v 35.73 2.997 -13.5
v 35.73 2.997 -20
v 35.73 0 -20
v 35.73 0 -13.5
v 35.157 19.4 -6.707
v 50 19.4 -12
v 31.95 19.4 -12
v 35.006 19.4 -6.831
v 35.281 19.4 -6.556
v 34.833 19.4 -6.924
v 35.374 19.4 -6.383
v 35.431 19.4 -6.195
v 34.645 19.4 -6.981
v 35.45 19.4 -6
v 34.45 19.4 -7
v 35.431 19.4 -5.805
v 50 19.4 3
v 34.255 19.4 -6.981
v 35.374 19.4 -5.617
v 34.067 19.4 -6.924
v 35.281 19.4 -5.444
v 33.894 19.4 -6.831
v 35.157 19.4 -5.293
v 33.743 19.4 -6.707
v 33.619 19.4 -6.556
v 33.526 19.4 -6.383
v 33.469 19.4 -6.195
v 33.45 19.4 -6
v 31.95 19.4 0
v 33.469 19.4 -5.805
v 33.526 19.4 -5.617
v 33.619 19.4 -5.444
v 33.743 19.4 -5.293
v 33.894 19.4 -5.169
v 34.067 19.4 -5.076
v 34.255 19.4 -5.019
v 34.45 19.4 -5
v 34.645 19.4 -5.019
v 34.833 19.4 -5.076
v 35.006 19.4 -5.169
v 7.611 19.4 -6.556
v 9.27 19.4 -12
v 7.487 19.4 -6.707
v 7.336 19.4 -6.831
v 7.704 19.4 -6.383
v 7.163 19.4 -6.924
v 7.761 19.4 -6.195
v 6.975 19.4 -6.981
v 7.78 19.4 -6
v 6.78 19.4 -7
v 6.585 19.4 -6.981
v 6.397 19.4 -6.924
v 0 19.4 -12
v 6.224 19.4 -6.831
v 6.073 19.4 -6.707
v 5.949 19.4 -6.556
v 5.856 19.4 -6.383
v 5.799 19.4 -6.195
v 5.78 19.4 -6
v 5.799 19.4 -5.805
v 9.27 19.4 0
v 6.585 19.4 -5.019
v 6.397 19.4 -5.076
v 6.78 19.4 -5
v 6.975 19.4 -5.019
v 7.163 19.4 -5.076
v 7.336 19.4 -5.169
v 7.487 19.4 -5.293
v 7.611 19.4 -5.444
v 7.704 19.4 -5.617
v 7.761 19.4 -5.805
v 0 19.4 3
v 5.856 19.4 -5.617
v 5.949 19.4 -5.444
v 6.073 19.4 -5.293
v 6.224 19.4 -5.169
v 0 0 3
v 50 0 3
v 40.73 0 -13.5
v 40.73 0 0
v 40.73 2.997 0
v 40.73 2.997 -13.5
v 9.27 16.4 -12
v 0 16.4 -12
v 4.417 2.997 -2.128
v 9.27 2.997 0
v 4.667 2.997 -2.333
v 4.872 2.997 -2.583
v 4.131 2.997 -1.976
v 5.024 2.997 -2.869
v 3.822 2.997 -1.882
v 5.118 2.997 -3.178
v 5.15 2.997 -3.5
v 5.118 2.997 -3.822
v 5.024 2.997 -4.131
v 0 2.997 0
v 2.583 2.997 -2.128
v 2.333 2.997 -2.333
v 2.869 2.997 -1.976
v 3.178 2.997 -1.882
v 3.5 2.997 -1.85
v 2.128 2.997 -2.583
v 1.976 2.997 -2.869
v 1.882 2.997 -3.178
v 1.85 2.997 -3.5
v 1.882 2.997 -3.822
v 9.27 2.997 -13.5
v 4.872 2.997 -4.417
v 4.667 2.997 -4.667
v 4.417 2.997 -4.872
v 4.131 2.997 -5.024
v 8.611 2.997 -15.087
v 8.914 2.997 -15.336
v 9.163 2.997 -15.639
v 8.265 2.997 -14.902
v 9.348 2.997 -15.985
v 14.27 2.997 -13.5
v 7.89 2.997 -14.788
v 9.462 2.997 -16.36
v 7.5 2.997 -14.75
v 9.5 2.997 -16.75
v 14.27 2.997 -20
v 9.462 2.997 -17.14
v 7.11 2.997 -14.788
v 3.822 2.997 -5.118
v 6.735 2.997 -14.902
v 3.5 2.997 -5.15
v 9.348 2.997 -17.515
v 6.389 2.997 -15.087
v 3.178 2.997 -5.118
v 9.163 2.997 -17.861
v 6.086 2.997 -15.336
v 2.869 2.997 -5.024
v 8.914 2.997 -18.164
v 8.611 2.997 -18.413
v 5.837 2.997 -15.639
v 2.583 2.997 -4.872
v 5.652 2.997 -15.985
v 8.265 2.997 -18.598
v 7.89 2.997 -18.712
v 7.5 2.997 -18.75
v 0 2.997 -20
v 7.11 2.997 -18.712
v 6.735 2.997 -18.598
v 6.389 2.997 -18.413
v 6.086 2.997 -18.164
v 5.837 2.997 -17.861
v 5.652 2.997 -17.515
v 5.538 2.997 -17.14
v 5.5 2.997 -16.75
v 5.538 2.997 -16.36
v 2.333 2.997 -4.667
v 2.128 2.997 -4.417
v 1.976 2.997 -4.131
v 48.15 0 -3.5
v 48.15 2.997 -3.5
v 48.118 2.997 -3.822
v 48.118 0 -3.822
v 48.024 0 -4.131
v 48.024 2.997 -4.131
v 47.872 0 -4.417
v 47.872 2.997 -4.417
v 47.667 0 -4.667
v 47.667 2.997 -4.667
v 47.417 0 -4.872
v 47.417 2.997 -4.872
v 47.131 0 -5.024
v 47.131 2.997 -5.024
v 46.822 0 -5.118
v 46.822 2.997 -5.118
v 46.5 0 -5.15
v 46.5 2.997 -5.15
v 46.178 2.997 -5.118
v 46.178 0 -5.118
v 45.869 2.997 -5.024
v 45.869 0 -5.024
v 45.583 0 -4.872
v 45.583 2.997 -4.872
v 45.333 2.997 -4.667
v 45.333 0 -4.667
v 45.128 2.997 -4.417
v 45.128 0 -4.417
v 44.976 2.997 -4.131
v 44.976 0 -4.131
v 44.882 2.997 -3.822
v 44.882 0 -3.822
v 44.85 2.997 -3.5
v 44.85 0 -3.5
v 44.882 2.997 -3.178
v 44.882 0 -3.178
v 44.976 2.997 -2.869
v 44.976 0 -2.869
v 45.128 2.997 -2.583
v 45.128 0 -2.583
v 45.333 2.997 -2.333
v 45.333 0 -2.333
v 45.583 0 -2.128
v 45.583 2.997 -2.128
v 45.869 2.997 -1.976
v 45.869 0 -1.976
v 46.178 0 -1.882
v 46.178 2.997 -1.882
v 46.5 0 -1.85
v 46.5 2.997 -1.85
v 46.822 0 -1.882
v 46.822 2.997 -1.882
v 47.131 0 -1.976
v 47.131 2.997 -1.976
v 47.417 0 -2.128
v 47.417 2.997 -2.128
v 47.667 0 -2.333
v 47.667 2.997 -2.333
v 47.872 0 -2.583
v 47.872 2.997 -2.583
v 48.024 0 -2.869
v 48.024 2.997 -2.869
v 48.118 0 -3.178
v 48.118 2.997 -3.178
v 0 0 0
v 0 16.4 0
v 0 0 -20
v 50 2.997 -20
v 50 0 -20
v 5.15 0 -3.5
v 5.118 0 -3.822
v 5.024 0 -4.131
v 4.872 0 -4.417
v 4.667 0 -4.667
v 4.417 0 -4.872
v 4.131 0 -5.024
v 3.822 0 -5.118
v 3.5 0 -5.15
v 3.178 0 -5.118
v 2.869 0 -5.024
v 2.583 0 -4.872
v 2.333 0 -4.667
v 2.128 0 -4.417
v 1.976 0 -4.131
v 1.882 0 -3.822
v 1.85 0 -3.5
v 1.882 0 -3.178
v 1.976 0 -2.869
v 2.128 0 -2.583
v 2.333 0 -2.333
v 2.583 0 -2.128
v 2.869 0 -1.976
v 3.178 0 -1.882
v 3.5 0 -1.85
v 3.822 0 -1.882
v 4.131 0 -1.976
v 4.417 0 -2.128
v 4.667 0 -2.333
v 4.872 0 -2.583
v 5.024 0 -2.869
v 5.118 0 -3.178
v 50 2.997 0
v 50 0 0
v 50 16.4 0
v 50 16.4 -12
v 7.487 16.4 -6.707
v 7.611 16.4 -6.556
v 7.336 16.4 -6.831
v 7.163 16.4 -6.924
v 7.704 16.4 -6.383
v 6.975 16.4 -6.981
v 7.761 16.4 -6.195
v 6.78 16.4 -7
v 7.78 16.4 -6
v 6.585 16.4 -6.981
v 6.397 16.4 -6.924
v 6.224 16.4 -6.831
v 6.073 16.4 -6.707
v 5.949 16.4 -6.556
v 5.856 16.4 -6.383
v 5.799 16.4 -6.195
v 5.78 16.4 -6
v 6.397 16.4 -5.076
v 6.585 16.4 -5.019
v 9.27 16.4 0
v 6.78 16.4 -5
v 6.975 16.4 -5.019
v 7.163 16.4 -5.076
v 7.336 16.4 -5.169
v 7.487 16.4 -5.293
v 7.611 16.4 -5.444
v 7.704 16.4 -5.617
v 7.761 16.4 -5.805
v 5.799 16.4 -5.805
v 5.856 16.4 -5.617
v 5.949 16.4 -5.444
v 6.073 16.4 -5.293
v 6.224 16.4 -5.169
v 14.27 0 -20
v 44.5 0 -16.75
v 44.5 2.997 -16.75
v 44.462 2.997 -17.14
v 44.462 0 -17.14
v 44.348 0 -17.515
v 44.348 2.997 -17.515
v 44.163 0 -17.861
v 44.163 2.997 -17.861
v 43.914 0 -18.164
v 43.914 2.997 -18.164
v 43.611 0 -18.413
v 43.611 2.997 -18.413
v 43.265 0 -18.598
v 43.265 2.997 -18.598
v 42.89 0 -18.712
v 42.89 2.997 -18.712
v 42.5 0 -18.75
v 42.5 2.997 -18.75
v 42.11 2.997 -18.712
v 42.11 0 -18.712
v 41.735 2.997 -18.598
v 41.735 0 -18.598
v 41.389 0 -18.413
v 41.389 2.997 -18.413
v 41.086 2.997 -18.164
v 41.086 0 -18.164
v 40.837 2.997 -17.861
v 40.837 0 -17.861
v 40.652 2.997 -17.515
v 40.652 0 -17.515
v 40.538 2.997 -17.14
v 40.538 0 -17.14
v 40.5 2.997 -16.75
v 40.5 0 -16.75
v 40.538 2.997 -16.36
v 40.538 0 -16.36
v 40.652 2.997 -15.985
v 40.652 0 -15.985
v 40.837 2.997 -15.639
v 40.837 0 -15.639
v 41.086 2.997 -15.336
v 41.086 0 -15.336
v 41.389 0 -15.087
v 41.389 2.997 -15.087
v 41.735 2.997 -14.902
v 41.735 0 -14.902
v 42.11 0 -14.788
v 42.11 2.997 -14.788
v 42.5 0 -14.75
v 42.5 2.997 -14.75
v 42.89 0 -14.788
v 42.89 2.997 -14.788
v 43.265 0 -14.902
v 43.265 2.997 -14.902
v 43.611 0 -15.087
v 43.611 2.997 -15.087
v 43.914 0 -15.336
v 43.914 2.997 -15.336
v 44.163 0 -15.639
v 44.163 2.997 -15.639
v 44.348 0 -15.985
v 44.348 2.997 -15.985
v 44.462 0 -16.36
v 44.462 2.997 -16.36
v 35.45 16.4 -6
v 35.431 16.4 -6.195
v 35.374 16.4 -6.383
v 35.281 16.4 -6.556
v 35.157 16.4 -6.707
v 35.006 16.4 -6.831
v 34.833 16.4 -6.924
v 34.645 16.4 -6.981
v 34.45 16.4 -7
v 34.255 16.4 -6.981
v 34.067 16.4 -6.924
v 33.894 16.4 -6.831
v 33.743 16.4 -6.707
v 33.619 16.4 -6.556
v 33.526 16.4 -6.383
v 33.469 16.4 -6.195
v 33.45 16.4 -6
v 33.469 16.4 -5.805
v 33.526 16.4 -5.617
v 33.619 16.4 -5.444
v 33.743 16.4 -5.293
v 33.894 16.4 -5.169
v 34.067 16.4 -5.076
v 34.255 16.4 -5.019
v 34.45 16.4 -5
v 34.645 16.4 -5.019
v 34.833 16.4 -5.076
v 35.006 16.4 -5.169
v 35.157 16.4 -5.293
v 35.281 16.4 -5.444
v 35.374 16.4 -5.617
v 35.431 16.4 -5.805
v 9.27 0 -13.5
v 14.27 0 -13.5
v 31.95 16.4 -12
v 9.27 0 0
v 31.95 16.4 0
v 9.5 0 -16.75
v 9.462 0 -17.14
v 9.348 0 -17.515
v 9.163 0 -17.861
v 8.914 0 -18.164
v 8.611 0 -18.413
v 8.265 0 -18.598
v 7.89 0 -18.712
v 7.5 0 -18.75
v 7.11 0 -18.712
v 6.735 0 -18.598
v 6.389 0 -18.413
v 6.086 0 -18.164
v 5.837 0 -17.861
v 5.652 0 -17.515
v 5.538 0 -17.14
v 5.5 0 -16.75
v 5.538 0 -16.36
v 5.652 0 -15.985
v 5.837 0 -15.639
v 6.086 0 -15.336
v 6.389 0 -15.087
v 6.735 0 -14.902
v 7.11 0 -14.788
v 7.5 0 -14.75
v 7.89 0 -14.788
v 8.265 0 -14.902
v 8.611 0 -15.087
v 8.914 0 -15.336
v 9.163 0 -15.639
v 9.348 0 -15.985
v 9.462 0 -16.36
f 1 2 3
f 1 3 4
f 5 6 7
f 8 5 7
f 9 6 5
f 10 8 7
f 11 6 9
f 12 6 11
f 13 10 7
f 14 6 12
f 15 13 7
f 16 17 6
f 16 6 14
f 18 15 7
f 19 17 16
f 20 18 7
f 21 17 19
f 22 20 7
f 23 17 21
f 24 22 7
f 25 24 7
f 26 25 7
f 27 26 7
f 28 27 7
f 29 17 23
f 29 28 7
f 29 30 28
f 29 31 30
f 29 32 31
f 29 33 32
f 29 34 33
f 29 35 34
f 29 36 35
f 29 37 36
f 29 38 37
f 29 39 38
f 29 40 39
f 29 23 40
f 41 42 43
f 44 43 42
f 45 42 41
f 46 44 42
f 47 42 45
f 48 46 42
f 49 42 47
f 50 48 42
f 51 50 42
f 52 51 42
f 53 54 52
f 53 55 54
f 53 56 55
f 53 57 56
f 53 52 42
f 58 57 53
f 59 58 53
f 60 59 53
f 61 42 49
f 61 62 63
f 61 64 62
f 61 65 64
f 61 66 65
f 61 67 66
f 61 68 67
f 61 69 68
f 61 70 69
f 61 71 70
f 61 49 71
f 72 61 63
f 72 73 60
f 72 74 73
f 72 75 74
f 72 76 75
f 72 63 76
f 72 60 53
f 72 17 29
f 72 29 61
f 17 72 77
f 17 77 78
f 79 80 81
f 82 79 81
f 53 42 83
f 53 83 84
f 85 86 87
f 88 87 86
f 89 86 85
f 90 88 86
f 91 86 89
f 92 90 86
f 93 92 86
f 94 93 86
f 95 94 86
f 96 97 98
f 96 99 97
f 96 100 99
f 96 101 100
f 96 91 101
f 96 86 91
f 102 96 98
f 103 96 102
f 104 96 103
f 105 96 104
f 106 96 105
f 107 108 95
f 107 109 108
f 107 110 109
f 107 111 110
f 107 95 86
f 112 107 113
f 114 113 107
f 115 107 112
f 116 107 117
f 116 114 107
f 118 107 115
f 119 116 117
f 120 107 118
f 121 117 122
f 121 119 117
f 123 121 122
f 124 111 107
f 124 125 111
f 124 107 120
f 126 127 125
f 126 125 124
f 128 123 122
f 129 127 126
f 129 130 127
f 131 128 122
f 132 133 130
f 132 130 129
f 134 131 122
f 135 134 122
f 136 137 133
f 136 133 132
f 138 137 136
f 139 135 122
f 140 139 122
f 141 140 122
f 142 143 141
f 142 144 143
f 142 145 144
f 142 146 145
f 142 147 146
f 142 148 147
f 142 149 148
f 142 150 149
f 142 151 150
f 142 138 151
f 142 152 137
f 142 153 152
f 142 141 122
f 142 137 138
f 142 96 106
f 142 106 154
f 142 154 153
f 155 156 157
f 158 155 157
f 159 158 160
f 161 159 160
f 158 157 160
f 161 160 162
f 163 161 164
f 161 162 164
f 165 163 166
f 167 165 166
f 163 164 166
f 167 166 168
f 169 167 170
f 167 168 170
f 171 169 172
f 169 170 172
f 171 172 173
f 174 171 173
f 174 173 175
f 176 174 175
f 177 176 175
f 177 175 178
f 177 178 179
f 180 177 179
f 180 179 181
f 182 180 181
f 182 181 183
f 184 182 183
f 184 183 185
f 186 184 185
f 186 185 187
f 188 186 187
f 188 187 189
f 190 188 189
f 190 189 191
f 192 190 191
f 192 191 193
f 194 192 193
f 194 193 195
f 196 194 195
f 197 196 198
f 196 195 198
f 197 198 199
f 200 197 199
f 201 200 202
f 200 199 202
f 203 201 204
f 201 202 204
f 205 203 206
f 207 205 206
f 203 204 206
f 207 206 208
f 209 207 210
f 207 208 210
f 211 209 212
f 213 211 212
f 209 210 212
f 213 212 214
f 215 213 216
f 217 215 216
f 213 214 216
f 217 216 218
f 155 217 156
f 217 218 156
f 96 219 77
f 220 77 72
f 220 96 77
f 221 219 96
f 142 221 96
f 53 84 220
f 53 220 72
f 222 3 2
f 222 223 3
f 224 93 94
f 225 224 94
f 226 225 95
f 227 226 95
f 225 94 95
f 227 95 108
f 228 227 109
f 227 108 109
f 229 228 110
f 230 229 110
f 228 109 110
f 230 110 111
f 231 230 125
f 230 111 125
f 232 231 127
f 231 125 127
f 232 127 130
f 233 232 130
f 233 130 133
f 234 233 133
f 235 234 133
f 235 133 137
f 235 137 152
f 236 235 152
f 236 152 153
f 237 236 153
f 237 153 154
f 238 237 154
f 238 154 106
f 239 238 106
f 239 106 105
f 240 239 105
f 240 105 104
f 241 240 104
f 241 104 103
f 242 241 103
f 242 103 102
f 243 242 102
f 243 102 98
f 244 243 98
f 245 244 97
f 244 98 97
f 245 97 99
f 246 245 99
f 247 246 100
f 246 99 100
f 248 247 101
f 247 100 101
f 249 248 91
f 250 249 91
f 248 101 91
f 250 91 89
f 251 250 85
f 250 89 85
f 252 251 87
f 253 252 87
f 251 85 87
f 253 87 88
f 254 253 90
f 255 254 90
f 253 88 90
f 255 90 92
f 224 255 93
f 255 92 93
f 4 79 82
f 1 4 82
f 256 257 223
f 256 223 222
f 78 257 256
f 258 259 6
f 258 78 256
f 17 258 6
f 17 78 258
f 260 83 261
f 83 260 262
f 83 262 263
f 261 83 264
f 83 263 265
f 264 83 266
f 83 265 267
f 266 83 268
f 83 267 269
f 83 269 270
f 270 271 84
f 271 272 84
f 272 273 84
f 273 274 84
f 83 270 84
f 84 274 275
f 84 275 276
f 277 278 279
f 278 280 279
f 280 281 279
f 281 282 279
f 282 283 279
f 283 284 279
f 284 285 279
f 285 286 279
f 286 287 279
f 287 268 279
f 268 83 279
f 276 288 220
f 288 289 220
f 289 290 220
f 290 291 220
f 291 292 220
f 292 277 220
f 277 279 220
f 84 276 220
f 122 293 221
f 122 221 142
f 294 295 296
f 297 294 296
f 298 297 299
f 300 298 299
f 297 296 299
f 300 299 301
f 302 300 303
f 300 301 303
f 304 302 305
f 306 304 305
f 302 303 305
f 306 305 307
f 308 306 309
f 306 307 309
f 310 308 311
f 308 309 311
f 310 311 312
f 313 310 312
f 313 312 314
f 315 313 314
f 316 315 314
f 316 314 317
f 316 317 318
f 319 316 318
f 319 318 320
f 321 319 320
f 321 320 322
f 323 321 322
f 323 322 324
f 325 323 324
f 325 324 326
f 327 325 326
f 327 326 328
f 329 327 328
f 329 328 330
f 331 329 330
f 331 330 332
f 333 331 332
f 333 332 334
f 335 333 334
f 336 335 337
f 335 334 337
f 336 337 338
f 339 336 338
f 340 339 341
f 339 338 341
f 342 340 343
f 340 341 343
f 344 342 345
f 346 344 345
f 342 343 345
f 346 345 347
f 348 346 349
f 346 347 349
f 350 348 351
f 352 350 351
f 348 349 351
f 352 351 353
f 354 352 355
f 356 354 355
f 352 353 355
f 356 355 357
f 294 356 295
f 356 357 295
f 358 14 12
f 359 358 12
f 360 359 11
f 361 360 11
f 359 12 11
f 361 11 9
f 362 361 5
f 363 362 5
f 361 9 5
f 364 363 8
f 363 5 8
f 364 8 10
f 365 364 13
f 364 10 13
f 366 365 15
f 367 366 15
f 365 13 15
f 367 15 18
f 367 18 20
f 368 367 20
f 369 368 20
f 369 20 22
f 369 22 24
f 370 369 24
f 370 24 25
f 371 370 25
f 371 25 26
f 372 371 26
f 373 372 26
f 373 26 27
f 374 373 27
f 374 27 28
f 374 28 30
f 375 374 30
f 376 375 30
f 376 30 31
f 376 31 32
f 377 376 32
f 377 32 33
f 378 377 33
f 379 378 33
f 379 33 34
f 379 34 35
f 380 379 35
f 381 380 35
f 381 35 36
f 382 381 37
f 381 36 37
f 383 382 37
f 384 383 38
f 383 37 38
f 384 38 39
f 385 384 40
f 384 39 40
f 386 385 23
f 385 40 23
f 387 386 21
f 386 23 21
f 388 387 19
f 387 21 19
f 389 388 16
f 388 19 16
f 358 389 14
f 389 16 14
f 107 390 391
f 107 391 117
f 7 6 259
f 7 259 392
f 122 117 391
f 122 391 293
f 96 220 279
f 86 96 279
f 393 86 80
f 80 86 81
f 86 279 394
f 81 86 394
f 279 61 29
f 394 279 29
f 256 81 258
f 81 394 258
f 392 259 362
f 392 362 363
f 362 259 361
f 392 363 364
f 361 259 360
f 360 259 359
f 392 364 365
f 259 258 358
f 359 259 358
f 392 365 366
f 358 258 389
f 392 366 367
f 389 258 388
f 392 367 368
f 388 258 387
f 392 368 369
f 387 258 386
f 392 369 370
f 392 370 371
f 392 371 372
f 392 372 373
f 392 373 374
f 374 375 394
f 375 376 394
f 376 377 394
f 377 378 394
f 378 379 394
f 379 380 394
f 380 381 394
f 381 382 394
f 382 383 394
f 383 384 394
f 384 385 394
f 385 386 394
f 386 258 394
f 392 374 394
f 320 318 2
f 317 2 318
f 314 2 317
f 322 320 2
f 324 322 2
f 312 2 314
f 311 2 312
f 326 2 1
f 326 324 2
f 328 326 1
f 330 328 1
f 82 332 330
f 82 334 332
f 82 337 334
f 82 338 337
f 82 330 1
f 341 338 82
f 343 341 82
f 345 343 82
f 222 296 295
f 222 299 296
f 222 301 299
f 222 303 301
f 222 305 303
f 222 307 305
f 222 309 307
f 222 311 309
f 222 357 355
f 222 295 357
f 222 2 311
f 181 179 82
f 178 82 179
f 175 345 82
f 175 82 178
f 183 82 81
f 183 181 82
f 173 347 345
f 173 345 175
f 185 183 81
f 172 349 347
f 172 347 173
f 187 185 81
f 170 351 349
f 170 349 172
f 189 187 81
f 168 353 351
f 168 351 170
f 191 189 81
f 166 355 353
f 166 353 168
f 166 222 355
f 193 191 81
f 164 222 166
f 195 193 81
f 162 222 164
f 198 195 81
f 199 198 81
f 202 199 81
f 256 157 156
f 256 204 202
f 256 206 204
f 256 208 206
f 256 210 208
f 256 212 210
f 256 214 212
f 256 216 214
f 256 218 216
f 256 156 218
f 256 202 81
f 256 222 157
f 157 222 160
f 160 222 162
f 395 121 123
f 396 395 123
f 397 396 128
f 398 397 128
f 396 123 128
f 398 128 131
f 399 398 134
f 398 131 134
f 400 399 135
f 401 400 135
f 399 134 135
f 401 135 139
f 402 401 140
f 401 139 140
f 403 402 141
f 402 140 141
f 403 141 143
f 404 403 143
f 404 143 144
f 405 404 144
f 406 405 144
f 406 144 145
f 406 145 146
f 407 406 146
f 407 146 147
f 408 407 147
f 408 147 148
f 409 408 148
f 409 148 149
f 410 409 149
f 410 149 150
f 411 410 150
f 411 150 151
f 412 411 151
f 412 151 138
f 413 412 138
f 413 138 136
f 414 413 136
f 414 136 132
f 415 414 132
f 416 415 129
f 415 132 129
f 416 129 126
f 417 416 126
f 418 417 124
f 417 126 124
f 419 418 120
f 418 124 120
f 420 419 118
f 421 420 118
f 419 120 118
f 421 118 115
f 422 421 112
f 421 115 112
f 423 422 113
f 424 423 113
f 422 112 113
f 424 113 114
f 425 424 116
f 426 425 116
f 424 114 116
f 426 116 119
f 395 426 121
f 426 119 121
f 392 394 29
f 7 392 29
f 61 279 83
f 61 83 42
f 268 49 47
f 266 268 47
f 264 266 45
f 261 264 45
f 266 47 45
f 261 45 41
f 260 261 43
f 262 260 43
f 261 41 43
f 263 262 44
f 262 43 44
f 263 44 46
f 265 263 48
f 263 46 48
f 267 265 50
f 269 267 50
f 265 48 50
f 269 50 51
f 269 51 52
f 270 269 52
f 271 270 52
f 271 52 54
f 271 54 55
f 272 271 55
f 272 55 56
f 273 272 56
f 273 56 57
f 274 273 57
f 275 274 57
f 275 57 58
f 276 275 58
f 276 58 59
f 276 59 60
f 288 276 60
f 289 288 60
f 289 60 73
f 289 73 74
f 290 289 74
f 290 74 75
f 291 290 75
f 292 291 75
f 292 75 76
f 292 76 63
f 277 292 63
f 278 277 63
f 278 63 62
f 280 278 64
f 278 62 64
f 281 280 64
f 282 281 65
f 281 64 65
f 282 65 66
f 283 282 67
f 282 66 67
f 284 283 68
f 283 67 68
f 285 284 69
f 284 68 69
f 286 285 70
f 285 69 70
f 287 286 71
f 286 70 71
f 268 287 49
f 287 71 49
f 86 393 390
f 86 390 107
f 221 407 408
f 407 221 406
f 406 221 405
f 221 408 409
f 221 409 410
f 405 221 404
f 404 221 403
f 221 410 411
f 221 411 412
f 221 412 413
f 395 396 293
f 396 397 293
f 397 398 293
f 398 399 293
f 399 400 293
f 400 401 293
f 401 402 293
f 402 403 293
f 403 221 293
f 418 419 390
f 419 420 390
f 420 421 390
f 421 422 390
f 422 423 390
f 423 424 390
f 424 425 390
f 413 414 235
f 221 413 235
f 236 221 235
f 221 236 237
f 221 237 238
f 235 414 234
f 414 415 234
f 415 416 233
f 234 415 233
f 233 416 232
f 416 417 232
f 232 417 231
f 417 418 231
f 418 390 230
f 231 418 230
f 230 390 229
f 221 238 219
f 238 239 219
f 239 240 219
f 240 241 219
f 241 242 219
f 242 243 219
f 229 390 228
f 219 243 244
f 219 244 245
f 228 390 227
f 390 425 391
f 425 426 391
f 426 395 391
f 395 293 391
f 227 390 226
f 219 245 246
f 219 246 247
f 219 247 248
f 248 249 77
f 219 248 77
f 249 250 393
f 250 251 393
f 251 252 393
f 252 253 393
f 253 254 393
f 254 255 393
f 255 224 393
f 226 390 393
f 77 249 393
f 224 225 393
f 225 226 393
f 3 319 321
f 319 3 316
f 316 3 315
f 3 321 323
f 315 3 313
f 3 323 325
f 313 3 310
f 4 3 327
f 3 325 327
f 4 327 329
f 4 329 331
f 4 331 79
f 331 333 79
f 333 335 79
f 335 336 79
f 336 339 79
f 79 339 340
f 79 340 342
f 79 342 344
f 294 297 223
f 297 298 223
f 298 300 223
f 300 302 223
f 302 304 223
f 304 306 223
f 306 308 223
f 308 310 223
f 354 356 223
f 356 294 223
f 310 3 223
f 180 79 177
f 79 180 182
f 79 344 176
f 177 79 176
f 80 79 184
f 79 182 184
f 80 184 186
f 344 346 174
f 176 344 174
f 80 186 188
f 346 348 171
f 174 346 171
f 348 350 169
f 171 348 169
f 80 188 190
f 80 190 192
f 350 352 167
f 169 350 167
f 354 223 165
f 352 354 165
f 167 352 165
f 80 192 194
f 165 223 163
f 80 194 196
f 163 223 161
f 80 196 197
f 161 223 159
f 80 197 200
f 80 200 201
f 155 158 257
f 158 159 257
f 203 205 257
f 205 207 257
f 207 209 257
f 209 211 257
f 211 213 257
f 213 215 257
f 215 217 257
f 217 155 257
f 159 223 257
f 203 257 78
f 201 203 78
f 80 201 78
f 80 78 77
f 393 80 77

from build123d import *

# Parameters (mm, degrees)
SKETCH_1_W          = 50
SKETCH_1_H          = 19.4
EXTRUDE_1_DEPTH     = 3
SKETCH_2_W          = 18.05
SKETCH_2_H          = 3
SKETCH_2_W_2        = 9.27
EXTRUDE_3_DEPTH     = 12
SKETCH_5_R          = 1
CUT_EXTRUDE_1_DEPTH = 4
SKETCH_6_W          = 9.27
SKETCH_6_H          = 2.996679997
EXTRUDE_5_DEPTH     = 20
SKETCH_9_W          = 6.5
SKETCH_9_H          = 2.996679997
EXTRUDE_6_DEPTH     = 5
SKETCH_10_W         = 6.5
SKETCH_10_H         = 2.996679997
EXTRUDE_7_DEPTH     = 5
SKETCH_11_R         = 2
SKETCH_11_R_2       = 1.65
CUT_EXTRUDE_3_DEPTH = 5
SKETCH_12_R         = 2
SKETCH_12_R_2       = 1.65
CUT_EXTRUDE_4_DEPTH = 5


with BuildPart() as part:
    # 草图1 → 凸台-拉伸1 (new body)
    with BuildSketch(Plane.XY):
        with Locations((25, 9.7)):
            Rectangle(SKETCH_1_W, SKETCH_1_H)
    extrude(amount=EXTRUDE_1_DEPTH)

    # 草图2 → 凸台-拉伸3 (add)
    with BuildSketch(Plane(origin=(0, 0, 0), x_dir=(-1, 0, 0), z_dir=(0, 0, -1))):
        with Locations((-40.975, 17.9)):
            Rectangle(SKETCH_2_W, SKETCH_2_H)
        with Locations((-4.635, 17.9)):
            Rectangle(SKETCH_2_W_2, SKETCH_2_H)
    extrude(amount=EXTRUDE_3_DEPTH)

    # 草图5 → 切除-拉伸1 (cut)
    with BuildSketch(Plane(origin=(0, 19.4, 0), x_dir=(1, 0, 0), z_dir=(0, 1, 0))):
        with Locations((34.45, 6)):
            Circle(SKETCH_5_R)
        with Locations((6.78, 6)):
            Circle(SKETCH_5_R)
    extrude(amount=-CUT_EXTRUDE_1_DEPTH, mode=Mode.SUBTRACT)

    # 草图6 → 凸台-拉伸5 (add)
    with BuildSketch(Plane(origin=(0, 0, 0), x_dir=(-1, 0, 0), z_dir=(0, 0, -1))):
        with Locations((-45.365, 1.498339999)):
            Rectangle(SKETCH_6_W, SKETCH_6_H)
        with Locations((-4.635, 1.498339999)):
            Rectangle(SKETCH_6_W, SKETCH_6_H)
    extrude(amount=EXTRUDE_5_DEPTH)

    # 草图9 → 凸台-拉伸6 (add)
    with BuildSketch(Plane(origin=(9.27, 0, 0), x_dir=(0, 0, -1), z_dir=(1, 0, 0))):
        with Locations((16.75, 1.498339999)):
            Rectangle(SKETCH_9_W, SKETCH_9_H)
    extrude(amount=EXTRUDE_6_DEPTH)

    # 草图10 → 凸台-拉伸7 (add)
    with BuildSketch(Plane.ZY.offset(-40.73)):
        with Locations((-16.75, 1.498339999)):
            Rectangle(SKETCH_10_W, SKETCH_10_H)
    extrude(amount=EXTRUDE_7_DEPTH)

    # 草图11 → 切除-拉伸3 (cut)
    with BuildSketch(Plane(origin=(0, 2.996679997, 0), x_dir=(1, 0, 0), z_dir=(0, 1, 0))):
        with Locations((42.5, 16.75)):
            Circle(SKETCH_11_R)
        with Locations((46.5, 3.5)):
            Circle(SKETCH_11_R_2)
    extrude(amount=-CUT_EXTRUDE_3_DEPTH, mode=Mode.SUBTRACT)

    # 草图12 → 切除-拉伸4 (cut)
    with BuildSketch(Plane(origin=(0, 2.996679997, 0), x_dir=(1, 0, 0), z_dir=(0, 1, 0))):
        with Locations((7.5, 16.75)):
            Circle(SKETCH_12_R)
        with Locations((3.5, 3.5)):
            Circle(SKETCH_12_R_2)
    extrude(amount=-CUT_EXTRUDE_4_DEPTH, mode=Mode.SUBTRACT)


solid = part.part
